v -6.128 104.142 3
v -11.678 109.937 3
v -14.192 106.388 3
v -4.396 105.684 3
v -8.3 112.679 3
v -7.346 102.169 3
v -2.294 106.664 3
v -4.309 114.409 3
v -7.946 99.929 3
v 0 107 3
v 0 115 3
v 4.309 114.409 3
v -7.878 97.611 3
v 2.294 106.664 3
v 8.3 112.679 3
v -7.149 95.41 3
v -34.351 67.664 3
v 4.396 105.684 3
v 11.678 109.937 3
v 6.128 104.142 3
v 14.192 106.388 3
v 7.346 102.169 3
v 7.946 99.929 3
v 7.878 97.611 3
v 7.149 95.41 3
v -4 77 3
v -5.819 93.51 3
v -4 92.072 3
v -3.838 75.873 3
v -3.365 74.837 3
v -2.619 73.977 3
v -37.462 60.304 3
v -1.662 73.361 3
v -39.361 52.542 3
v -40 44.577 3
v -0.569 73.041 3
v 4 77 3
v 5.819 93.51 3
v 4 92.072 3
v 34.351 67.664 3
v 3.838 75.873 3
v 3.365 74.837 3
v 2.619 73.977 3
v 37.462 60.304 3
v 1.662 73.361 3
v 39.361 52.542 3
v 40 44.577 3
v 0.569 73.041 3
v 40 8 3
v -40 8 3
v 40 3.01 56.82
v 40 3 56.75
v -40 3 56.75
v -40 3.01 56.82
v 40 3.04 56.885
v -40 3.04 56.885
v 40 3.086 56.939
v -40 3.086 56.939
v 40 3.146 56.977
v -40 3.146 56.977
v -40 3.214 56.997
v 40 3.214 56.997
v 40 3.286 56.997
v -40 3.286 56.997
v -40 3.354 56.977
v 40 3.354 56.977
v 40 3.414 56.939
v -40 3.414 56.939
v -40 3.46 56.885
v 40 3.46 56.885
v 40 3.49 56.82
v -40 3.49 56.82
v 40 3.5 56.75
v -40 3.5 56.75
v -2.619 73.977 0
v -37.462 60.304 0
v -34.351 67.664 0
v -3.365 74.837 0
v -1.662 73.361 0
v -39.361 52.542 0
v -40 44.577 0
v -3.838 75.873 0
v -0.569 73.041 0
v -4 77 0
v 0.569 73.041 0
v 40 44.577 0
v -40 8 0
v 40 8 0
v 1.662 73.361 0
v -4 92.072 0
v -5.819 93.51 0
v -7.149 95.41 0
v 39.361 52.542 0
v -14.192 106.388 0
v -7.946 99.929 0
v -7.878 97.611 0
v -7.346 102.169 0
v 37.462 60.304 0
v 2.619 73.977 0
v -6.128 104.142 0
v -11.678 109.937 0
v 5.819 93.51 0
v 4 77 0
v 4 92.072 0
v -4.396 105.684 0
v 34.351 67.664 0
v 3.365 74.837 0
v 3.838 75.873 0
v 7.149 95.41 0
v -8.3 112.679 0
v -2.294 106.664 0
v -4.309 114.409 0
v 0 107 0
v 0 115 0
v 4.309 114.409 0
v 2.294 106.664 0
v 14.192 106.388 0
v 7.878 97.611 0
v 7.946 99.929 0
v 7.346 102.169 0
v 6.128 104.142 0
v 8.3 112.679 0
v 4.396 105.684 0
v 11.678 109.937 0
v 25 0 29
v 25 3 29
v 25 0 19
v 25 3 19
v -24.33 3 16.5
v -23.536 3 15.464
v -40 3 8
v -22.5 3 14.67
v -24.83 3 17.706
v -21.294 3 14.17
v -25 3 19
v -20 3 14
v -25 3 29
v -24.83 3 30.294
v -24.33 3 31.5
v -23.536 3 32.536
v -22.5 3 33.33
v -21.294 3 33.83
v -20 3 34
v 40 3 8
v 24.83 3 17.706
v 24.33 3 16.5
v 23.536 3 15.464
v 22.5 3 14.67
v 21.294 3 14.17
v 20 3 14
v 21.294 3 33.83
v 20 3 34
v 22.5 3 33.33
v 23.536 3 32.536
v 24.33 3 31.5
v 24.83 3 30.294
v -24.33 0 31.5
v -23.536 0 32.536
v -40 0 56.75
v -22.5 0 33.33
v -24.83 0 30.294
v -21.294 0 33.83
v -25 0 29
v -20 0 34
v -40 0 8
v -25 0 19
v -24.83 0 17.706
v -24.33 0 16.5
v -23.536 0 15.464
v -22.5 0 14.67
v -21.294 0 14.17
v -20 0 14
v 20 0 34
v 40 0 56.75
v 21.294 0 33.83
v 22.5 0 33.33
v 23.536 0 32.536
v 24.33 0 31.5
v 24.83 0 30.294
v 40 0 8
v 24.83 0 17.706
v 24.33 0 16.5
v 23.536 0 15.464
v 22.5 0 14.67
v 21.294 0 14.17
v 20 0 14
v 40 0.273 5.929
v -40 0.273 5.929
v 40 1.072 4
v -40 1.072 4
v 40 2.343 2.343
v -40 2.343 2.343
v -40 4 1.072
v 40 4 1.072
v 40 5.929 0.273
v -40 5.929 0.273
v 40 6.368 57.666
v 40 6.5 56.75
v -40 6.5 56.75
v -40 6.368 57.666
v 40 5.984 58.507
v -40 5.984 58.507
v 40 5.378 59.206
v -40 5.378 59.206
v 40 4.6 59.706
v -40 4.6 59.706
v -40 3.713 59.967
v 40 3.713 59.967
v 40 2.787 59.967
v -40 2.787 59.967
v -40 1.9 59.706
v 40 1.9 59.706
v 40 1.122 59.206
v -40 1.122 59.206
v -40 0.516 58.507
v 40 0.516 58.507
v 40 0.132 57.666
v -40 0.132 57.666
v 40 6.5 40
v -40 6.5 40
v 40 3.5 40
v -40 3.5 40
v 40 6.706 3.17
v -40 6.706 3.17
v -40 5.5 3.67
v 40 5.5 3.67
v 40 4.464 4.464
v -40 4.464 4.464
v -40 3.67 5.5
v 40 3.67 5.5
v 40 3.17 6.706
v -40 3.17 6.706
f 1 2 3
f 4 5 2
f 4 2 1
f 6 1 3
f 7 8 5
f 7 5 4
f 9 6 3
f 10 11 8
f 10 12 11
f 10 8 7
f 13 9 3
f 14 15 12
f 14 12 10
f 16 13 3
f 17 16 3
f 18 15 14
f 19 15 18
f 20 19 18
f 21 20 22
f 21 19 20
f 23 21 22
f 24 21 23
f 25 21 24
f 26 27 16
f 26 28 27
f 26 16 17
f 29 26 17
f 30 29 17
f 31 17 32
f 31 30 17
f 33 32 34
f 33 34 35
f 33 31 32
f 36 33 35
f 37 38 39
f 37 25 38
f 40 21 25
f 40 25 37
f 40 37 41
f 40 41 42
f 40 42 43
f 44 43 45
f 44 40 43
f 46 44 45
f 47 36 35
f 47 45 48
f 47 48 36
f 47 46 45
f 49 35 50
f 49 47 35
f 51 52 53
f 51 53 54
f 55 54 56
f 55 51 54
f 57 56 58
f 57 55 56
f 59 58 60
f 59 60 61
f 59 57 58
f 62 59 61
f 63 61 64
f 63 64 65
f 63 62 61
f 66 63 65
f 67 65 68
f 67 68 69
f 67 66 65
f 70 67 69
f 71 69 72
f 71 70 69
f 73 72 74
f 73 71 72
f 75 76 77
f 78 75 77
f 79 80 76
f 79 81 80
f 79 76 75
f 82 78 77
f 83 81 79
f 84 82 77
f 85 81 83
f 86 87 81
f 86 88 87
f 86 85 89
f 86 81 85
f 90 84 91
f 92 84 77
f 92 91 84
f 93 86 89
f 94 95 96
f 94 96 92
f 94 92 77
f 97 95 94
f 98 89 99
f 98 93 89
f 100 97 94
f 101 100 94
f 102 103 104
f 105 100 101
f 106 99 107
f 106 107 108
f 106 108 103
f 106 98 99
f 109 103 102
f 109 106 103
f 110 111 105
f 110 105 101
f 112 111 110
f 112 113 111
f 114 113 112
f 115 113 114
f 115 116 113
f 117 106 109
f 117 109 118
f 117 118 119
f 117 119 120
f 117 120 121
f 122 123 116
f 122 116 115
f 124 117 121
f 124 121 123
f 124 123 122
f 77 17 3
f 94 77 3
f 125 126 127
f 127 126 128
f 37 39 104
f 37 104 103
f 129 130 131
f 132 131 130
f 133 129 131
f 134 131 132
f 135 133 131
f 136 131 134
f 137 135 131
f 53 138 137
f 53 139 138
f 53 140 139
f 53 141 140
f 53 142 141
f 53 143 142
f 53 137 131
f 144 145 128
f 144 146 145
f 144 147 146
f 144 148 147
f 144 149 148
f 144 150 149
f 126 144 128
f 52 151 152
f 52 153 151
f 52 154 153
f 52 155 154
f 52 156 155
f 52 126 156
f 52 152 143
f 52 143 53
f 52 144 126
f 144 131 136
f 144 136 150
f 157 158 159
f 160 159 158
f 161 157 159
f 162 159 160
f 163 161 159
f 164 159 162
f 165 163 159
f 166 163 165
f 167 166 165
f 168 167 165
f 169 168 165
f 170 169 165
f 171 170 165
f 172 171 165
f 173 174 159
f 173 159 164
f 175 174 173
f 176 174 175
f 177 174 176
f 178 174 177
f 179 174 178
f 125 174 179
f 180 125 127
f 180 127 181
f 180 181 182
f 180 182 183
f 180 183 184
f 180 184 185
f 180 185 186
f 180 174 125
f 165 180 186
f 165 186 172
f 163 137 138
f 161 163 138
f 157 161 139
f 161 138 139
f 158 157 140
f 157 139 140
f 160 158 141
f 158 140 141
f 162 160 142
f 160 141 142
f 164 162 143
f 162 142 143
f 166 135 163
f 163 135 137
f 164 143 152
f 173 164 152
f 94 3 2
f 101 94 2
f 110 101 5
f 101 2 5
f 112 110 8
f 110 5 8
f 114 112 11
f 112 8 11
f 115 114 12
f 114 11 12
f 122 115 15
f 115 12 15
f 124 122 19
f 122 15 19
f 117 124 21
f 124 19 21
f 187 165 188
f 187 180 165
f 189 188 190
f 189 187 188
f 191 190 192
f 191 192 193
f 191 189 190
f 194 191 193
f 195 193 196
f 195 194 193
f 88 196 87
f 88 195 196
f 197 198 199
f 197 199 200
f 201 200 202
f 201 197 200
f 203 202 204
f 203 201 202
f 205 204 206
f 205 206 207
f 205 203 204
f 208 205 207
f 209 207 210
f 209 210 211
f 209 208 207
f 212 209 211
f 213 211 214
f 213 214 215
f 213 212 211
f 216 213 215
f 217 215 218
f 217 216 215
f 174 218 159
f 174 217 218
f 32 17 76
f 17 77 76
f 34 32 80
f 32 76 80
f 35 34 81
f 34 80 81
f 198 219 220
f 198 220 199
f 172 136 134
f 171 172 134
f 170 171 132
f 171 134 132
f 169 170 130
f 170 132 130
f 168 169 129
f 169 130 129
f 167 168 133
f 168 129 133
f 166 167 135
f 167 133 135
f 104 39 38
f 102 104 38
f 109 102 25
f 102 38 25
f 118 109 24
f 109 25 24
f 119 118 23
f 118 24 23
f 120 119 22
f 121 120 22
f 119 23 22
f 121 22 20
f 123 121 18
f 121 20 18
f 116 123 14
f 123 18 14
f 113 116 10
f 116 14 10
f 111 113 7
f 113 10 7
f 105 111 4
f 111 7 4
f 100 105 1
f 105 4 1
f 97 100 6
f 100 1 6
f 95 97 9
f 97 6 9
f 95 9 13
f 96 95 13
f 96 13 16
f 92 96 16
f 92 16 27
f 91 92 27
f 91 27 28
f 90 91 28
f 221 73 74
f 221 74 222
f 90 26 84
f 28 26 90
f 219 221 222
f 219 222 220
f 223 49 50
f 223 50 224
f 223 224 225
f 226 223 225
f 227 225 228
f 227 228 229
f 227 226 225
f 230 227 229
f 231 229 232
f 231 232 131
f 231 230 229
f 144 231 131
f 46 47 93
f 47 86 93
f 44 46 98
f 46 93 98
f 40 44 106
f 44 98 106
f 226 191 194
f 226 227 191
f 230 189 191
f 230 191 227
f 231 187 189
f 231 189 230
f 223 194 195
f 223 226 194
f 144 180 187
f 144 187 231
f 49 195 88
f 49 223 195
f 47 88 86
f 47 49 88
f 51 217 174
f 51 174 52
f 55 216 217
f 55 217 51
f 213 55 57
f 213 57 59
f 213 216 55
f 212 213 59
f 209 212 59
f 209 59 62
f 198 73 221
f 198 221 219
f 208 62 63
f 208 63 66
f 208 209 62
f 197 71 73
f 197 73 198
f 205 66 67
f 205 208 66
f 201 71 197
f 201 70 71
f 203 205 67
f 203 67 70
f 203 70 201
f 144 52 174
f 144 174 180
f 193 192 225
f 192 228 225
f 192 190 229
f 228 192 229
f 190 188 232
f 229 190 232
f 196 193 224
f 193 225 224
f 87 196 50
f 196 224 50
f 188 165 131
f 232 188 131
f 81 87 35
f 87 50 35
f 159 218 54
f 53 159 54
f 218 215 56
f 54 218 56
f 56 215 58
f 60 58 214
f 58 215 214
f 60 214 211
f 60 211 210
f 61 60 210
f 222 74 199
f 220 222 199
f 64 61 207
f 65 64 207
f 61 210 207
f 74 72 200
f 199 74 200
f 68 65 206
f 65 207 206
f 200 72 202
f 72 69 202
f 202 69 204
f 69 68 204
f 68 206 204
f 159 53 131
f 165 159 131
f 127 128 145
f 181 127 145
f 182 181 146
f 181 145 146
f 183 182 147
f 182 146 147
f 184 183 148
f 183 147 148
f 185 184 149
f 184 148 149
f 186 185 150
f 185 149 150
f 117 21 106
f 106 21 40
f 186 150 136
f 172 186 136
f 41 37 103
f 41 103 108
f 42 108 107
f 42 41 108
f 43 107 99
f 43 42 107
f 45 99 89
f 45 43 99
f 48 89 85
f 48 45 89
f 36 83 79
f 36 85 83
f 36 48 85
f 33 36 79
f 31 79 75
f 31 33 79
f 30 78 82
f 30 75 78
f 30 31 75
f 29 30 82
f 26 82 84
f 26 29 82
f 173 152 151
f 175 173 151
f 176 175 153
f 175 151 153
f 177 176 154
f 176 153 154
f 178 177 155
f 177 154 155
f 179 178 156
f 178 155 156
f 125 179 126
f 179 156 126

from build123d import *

# Parameters (mm, degrees)
BOSS_EXTRUDE1_DEPTH     = 40
CUT_EXTRUDE2_DEPTH      = 58
CUT_EXTRUDE2_DEPTH_BACK = 4
FILLET2_R               = 50
SKETCH4_R               = 8
CUT_EXTRUDE4_DEPTH      = 58
CUT_EXTRUDE4_DEPTH_BACK = 4
CUT_EXTRUDE5_DEPTH      = 113
CUT_EXTRUDE5_DEPTH_BACK = 4


with BuildPart() as part:
    # Sketch1 → Boss-Extrude1 (new body, symmetric)
    with BuildSketch(Plane.YZ):
        with BuildLine():
            Line((8, 0), (115, 0))
            Line((115, 0), (115, 3))
            Line((115, 3), (8, 3))
            ThreePointArc((8, 3), (4.464466094, 4.464466094), (3, 8))
            Line((3, 8), (3, 56.75))
            ThreePointArc((3, 56.75), (3.25, 57), (3.5, 56.75))
            Line((3.5, 56.75), (3.5, 40))
            Line((3.5, 40), (6.5, 40))
            Line((6.5, 40), (6.5, 56.75))
            ThreePointArc((6.5, 56.75), (3.25, 60), (0, 56.75))
            Line((0, 56.75), (0, 8))
            ThreePointArc((0, 8), (2.343145751, 2.343145751), (8, 0))
        make_face()
    extrude(amount=BOSS_EXTRUDE1_DEPTH, both=True)

    # Sketch2 → Cut-Extrude2 (cut, two sides)
    with BuildSketch(Plane.XY.offset(3)) as cut_extrude2_sk:
        with BuildLine():
            Line((-135.973206715, -127.551210724), (-40, 56.811604044))
            Line((-40, 56.811604044), (-14.192173331, 106.387977812))
            ThreePointArc((-14.192173331, 106.387977812), (0, 115), (14.192173331, 106.387977812))
            Line((14.192173331, 106.387977812), (40, 56.811604044))
            Line((40, 56.811604044), (135.973206715, -127.551210724))
            Line((135.973206715, -127.551210724), (135.973206715, 288.143407362))
            Line((135.973206715, 288.143407362), (-135.973206715, 288.143407362))
            Line((-135.973206715, 288.143407362), (-135.973206715, -127.551210724))
        make_face()
    extrude(amount=CUT_EXTRUDE2_DEPTH, mode=Mode.SUBTRACT)
    extrude(cut_extrude2_sk.sketch, amount=-CUT_EXTRUDE2_DEPTH_BACK, mode=Mode.SUBTRACT)

    # Fillet2
    fillet2_edges = [part.edges().sort_by_distance(p)[0] for p in [
        (-40, 56.811604044, 1.5),
        (40, 56.811604044, 1.5),
    ]]
    fillet(fillet2_edges, radius=FILLET2_R)

    # Sketch4 → Cut-Extrude4 (cut, two sides)
    with BuildSketch(Plane.XY.offset(3)) as cut_extrude4_sk:
        with Locations((0, 99)):
            Circle(SKETCH4_R)
        with BuildLine():
            Line((4, 99), (4, 77))
            ThreePointArc((4, 77), (0, 73), (-4, 77))
            Line((-4, 77), (-4, 99))
            ThreePointArc((-4, 99), (0, 103), (4, 99))
        make_face()
    extrude(amount=CUT_EXTRUDE4_DEPTH, mode=Mode.SUBTRACT)
    extrude(cut_extrude4_sk.sketch, amount=-CUT_EXTRUDE4_DEPTH_BACK, mode=Mode.SUBTRACT)

    # Sketch5 → Cut-Extrude5 (cut, two sides)
    with BuildSketch(Plane(origin=(0, 3, 0), x_dir=(-1, 0, 0), z_dir=(0, 1, 0))) as cut_extrude5_sk:
        with BuildLine():
            Line((-20, 14), (20, 14))
            ThreePointArc((20, 14), (23.535533906, 15.464466094), (25, 19))
            Line((25, 19), (25, 29))
            ThreePointArc((25, 29), (23.535533906, 32.535533906), (20, 34))
            Line((20, 34), (-20, 34))
            ThreePointArc((-20, 34), (-23.535533906, 32.535533906), (-25, 29))
            Line((-25, 29), (-25, 19))
            ThreePointArc((-25, 19), (-23.535533906, 15.464466094), (-20, 14))
        make_face()
    extrude(amount=CUT_EXTRUDE5_DEPTH, mode=Mode.SUBTRACT)
    extrude(cut_extrude5_sk.sketch, amount=-CUT_EXTRUDE5_DEPTH_BACK, mode=Mode.SUBTRACT)


solid = part.part
